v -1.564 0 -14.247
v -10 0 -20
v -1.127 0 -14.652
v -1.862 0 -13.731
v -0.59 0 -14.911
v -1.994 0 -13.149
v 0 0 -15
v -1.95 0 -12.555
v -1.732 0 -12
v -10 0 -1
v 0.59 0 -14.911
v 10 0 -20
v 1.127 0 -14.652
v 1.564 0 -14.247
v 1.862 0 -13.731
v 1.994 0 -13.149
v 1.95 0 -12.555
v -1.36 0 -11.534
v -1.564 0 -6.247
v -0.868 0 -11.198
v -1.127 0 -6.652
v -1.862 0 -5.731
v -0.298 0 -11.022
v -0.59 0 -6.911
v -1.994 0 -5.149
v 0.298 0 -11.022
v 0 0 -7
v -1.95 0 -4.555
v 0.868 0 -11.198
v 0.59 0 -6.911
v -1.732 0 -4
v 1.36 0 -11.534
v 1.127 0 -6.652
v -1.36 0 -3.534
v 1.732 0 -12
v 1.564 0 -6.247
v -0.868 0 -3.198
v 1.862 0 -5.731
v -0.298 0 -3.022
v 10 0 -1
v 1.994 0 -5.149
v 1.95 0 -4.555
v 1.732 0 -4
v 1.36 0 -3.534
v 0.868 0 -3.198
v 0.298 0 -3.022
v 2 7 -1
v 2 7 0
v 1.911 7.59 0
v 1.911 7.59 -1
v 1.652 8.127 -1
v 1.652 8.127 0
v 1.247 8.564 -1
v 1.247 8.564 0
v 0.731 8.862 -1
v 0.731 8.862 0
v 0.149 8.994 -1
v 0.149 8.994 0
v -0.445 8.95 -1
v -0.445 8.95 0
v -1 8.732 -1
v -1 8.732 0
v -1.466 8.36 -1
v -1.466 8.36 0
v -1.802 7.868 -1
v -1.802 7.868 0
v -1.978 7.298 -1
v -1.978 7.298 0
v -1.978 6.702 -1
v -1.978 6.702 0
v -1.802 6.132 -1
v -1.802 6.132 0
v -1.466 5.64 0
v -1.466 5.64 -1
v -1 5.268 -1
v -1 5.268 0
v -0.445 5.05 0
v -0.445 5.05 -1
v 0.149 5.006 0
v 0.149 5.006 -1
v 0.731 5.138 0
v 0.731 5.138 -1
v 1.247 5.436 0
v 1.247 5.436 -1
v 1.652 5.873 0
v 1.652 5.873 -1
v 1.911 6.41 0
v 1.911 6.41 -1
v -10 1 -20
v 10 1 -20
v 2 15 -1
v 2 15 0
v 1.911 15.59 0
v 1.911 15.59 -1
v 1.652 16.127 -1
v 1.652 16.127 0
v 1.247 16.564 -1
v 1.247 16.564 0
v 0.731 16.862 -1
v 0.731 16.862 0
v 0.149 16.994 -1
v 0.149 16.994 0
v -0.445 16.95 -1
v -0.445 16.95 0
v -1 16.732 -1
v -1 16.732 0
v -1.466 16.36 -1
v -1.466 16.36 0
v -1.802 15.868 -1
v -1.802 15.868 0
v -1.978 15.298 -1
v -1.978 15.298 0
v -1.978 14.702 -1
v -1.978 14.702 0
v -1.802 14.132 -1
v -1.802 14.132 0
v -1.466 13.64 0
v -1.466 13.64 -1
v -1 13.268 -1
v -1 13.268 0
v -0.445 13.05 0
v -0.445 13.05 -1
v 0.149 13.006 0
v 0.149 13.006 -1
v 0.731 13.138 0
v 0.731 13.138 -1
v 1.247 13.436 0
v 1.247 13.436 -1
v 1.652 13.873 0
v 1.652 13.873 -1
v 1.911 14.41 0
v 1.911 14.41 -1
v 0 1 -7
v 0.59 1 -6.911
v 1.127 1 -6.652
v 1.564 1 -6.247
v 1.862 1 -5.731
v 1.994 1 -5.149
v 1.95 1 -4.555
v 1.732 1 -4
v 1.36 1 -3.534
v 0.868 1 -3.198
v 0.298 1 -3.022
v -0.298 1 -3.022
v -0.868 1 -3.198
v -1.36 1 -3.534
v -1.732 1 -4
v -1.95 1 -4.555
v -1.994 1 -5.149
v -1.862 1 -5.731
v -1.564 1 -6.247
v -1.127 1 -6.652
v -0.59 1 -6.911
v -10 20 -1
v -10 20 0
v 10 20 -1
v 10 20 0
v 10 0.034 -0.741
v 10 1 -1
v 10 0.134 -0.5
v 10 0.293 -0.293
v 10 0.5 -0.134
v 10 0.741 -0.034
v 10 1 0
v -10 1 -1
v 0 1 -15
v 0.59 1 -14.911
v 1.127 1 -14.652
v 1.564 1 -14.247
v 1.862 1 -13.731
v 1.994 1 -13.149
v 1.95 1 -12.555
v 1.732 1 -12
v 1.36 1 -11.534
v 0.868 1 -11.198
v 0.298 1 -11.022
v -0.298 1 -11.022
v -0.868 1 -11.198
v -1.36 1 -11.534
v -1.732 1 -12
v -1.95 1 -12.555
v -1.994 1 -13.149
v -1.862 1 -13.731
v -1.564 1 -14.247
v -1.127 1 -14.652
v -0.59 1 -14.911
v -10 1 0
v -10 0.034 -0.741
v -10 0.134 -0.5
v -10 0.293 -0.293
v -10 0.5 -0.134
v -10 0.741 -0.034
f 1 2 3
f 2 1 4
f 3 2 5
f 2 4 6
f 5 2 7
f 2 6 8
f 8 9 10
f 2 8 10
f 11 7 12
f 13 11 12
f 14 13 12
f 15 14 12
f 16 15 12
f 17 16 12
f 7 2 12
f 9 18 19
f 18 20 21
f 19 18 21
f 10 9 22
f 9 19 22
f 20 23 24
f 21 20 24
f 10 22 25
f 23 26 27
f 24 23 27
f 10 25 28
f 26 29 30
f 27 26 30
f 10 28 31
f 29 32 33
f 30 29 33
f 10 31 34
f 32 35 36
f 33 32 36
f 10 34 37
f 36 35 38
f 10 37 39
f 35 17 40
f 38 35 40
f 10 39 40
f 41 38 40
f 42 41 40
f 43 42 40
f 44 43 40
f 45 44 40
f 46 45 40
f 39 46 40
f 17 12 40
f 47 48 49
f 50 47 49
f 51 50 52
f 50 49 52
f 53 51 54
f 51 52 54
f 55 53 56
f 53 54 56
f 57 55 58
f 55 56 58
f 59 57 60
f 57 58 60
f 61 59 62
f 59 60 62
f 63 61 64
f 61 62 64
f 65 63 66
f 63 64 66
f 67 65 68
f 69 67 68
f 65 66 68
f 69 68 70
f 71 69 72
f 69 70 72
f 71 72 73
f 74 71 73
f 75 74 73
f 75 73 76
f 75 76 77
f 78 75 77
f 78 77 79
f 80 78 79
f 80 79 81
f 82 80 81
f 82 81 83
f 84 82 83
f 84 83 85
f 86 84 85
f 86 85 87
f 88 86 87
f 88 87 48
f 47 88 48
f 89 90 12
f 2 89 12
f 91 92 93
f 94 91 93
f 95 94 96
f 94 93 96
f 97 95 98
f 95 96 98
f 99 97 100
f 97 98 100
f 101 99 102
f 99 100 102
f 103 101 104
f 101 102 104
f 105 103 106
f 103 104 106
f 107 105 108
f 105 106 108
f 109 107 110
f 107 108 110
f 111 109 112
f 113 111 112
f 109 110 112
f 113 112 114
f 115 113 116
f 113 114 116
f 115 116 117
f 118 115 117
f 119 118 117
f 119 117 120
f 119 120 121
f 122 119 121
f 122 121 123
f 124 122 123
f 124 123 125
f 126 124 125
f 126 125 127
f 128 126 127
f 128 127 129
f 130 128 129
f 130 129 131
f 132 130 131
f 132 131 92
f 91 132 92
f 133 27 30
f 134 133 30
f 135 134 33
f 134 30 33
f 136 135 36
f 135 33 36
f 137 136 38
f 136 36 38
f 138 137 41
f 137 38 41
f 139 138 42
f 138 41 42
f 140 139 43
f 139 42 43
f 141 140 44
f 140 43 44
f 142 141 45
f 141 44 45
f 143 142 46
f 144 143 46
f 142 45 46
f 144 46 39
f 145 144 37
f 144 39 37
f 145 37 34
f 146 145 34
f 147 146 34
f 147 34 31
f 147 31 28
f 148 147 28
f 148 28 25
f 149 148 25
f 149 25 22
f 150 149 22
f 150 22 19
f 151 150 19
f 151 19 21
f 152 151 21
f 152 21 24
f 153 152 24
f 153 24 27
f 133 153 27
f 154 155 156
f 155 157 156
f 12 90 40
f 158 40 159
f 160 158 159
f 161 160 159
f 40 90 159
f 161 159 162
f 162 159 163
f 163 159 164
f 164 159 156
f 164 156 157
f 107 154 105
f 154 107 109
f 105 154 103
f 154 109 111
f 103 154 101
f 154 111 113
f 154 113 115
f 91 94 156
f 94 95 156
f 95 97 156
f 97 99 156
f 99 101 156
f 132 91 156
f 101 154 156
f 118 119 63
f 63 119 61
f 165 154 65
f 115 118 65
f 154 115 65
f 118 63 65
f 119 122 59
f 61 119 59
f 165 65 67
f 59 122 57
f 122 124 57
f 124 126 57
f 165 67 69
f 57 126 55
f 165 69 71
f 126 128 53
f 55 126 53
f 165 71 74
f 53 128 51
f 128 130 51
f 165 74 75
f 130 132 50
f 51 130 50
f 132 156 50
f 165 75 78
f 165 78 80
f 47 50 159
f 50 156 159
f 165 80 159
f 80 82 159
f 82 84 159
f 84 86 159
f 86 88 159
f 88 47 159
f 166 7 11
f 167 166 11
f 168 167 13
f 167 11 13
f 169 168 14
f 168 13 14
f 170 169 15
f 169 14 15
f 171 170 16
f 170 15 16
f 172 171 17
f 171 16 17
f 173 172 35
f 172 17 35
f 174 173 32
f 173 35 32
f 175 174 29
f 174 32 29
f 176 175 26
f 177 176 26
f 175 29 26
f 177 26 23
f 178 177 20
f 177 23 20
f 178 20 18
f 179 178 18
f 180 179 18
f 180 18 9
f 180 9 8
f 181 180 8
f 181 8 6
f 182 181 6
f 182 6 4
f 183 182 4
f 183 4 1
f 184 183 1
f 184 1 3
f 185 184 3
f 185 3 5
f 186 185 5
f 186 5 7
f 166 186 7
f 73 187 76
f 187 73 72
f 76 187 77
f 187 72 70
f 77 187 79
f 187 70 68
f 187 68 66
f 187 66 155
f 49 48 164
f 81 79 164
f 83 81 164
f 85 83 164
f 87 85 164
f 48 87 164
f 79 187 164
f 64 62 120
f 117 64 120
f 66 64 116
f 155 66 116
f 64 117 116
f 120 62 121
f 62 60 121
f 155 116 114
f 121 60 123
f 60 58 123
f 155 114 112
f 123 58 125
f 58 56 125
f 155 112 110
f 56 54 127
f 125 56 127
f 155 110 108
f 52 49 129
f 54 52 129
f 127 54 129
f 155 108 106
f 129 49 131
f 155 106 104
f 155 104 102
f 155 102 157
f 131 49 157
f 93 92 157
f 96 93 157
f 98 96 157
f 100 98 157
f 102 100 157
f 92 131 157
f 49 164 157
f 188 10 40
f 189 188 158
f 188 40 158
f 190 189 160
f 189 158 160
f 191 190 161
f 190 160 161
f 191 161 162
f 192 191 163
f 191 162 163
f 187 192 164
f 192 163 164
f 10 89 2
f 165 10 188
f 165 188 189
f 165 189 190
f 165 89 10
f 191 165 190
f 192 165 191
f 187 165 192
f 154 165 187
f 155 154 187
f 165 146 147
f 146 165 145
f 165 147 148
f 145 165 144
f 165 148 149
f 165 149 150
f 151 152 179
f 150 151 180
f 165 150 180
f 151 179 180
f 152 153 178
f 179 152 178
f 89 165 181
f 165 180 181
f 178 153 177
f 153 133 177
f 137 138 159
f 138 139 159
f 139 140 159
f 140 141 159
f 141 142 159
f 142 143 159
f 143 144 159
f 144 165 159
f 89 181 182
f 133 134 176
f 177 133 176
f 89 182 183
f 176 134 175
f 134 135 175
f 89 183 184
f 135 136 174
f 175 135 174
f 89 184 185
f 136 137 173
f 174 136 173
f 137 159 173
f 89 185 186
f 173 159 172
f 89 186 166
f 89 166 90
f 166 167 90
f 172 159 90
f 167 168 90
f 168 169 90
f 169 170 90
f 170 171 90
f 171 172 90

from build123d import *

# Parameters (mm, degrees)
BOSS_EXTRUDE1_DEPTH = 10
SKETCH2_R           = 2
CUT_EXTRUDE1_DEPTH  = 20
SKETCH3_R           = 2
CUT_EXTRUDE2_DEPTH  = 20


with BuildPart() as part:
    # Sketch1 → Boss-Extrude1 (new, symmetric)
    with BuildSketch(Plane(origin=(0, 0, 0), x_dir=(0, 0, -1), z_dir=(1, 0, 0))):
        with BuildLine():
            Line((20, 0), (1, 0))
            ThreePointArc((1, 0), (0.292893219, 0.292893219), (0, 1))
            Line((0, 1), (0, 20))
            Line((0, 20), (1, 20))
            Line((1, 20), (1, 1))
            Line((1, 1), (20, 1))
            Line((20, 1), (20, 0))
        make_face()
    extrude(amount=BOSS_EXTRUDE1_DEPTH, both=True)

    # Sketch2 → Cut-Extrude1 (cut)
    with BuildSketch(Plane.XY):
        with Locations((0, 7)):
            Circle(SKETCH2_R)
        with Locations((0, 15)):
            Circle(SKETCH2_R)
    extrude(amount=-CUT_EXTRUDE1_DEPTH, mode=Mode.SUBTRACT)

    # Sketch3 → Cut-Extrude2 (cut)
    with BuildSketch(Plane.XZ):
        with Locations(Location((0, -13, 0), (0, 0, 270))):
            Circle(SKETCH3_R)
        with Locations(Location((0, -5, 0), (0, 0, 270))):
            Circle(SKETCH3_R)
    extrude(amount=-CUT_EXTRUDE2_DEPTH, mode=Mode.SUBTRACT)


solid = part.part
